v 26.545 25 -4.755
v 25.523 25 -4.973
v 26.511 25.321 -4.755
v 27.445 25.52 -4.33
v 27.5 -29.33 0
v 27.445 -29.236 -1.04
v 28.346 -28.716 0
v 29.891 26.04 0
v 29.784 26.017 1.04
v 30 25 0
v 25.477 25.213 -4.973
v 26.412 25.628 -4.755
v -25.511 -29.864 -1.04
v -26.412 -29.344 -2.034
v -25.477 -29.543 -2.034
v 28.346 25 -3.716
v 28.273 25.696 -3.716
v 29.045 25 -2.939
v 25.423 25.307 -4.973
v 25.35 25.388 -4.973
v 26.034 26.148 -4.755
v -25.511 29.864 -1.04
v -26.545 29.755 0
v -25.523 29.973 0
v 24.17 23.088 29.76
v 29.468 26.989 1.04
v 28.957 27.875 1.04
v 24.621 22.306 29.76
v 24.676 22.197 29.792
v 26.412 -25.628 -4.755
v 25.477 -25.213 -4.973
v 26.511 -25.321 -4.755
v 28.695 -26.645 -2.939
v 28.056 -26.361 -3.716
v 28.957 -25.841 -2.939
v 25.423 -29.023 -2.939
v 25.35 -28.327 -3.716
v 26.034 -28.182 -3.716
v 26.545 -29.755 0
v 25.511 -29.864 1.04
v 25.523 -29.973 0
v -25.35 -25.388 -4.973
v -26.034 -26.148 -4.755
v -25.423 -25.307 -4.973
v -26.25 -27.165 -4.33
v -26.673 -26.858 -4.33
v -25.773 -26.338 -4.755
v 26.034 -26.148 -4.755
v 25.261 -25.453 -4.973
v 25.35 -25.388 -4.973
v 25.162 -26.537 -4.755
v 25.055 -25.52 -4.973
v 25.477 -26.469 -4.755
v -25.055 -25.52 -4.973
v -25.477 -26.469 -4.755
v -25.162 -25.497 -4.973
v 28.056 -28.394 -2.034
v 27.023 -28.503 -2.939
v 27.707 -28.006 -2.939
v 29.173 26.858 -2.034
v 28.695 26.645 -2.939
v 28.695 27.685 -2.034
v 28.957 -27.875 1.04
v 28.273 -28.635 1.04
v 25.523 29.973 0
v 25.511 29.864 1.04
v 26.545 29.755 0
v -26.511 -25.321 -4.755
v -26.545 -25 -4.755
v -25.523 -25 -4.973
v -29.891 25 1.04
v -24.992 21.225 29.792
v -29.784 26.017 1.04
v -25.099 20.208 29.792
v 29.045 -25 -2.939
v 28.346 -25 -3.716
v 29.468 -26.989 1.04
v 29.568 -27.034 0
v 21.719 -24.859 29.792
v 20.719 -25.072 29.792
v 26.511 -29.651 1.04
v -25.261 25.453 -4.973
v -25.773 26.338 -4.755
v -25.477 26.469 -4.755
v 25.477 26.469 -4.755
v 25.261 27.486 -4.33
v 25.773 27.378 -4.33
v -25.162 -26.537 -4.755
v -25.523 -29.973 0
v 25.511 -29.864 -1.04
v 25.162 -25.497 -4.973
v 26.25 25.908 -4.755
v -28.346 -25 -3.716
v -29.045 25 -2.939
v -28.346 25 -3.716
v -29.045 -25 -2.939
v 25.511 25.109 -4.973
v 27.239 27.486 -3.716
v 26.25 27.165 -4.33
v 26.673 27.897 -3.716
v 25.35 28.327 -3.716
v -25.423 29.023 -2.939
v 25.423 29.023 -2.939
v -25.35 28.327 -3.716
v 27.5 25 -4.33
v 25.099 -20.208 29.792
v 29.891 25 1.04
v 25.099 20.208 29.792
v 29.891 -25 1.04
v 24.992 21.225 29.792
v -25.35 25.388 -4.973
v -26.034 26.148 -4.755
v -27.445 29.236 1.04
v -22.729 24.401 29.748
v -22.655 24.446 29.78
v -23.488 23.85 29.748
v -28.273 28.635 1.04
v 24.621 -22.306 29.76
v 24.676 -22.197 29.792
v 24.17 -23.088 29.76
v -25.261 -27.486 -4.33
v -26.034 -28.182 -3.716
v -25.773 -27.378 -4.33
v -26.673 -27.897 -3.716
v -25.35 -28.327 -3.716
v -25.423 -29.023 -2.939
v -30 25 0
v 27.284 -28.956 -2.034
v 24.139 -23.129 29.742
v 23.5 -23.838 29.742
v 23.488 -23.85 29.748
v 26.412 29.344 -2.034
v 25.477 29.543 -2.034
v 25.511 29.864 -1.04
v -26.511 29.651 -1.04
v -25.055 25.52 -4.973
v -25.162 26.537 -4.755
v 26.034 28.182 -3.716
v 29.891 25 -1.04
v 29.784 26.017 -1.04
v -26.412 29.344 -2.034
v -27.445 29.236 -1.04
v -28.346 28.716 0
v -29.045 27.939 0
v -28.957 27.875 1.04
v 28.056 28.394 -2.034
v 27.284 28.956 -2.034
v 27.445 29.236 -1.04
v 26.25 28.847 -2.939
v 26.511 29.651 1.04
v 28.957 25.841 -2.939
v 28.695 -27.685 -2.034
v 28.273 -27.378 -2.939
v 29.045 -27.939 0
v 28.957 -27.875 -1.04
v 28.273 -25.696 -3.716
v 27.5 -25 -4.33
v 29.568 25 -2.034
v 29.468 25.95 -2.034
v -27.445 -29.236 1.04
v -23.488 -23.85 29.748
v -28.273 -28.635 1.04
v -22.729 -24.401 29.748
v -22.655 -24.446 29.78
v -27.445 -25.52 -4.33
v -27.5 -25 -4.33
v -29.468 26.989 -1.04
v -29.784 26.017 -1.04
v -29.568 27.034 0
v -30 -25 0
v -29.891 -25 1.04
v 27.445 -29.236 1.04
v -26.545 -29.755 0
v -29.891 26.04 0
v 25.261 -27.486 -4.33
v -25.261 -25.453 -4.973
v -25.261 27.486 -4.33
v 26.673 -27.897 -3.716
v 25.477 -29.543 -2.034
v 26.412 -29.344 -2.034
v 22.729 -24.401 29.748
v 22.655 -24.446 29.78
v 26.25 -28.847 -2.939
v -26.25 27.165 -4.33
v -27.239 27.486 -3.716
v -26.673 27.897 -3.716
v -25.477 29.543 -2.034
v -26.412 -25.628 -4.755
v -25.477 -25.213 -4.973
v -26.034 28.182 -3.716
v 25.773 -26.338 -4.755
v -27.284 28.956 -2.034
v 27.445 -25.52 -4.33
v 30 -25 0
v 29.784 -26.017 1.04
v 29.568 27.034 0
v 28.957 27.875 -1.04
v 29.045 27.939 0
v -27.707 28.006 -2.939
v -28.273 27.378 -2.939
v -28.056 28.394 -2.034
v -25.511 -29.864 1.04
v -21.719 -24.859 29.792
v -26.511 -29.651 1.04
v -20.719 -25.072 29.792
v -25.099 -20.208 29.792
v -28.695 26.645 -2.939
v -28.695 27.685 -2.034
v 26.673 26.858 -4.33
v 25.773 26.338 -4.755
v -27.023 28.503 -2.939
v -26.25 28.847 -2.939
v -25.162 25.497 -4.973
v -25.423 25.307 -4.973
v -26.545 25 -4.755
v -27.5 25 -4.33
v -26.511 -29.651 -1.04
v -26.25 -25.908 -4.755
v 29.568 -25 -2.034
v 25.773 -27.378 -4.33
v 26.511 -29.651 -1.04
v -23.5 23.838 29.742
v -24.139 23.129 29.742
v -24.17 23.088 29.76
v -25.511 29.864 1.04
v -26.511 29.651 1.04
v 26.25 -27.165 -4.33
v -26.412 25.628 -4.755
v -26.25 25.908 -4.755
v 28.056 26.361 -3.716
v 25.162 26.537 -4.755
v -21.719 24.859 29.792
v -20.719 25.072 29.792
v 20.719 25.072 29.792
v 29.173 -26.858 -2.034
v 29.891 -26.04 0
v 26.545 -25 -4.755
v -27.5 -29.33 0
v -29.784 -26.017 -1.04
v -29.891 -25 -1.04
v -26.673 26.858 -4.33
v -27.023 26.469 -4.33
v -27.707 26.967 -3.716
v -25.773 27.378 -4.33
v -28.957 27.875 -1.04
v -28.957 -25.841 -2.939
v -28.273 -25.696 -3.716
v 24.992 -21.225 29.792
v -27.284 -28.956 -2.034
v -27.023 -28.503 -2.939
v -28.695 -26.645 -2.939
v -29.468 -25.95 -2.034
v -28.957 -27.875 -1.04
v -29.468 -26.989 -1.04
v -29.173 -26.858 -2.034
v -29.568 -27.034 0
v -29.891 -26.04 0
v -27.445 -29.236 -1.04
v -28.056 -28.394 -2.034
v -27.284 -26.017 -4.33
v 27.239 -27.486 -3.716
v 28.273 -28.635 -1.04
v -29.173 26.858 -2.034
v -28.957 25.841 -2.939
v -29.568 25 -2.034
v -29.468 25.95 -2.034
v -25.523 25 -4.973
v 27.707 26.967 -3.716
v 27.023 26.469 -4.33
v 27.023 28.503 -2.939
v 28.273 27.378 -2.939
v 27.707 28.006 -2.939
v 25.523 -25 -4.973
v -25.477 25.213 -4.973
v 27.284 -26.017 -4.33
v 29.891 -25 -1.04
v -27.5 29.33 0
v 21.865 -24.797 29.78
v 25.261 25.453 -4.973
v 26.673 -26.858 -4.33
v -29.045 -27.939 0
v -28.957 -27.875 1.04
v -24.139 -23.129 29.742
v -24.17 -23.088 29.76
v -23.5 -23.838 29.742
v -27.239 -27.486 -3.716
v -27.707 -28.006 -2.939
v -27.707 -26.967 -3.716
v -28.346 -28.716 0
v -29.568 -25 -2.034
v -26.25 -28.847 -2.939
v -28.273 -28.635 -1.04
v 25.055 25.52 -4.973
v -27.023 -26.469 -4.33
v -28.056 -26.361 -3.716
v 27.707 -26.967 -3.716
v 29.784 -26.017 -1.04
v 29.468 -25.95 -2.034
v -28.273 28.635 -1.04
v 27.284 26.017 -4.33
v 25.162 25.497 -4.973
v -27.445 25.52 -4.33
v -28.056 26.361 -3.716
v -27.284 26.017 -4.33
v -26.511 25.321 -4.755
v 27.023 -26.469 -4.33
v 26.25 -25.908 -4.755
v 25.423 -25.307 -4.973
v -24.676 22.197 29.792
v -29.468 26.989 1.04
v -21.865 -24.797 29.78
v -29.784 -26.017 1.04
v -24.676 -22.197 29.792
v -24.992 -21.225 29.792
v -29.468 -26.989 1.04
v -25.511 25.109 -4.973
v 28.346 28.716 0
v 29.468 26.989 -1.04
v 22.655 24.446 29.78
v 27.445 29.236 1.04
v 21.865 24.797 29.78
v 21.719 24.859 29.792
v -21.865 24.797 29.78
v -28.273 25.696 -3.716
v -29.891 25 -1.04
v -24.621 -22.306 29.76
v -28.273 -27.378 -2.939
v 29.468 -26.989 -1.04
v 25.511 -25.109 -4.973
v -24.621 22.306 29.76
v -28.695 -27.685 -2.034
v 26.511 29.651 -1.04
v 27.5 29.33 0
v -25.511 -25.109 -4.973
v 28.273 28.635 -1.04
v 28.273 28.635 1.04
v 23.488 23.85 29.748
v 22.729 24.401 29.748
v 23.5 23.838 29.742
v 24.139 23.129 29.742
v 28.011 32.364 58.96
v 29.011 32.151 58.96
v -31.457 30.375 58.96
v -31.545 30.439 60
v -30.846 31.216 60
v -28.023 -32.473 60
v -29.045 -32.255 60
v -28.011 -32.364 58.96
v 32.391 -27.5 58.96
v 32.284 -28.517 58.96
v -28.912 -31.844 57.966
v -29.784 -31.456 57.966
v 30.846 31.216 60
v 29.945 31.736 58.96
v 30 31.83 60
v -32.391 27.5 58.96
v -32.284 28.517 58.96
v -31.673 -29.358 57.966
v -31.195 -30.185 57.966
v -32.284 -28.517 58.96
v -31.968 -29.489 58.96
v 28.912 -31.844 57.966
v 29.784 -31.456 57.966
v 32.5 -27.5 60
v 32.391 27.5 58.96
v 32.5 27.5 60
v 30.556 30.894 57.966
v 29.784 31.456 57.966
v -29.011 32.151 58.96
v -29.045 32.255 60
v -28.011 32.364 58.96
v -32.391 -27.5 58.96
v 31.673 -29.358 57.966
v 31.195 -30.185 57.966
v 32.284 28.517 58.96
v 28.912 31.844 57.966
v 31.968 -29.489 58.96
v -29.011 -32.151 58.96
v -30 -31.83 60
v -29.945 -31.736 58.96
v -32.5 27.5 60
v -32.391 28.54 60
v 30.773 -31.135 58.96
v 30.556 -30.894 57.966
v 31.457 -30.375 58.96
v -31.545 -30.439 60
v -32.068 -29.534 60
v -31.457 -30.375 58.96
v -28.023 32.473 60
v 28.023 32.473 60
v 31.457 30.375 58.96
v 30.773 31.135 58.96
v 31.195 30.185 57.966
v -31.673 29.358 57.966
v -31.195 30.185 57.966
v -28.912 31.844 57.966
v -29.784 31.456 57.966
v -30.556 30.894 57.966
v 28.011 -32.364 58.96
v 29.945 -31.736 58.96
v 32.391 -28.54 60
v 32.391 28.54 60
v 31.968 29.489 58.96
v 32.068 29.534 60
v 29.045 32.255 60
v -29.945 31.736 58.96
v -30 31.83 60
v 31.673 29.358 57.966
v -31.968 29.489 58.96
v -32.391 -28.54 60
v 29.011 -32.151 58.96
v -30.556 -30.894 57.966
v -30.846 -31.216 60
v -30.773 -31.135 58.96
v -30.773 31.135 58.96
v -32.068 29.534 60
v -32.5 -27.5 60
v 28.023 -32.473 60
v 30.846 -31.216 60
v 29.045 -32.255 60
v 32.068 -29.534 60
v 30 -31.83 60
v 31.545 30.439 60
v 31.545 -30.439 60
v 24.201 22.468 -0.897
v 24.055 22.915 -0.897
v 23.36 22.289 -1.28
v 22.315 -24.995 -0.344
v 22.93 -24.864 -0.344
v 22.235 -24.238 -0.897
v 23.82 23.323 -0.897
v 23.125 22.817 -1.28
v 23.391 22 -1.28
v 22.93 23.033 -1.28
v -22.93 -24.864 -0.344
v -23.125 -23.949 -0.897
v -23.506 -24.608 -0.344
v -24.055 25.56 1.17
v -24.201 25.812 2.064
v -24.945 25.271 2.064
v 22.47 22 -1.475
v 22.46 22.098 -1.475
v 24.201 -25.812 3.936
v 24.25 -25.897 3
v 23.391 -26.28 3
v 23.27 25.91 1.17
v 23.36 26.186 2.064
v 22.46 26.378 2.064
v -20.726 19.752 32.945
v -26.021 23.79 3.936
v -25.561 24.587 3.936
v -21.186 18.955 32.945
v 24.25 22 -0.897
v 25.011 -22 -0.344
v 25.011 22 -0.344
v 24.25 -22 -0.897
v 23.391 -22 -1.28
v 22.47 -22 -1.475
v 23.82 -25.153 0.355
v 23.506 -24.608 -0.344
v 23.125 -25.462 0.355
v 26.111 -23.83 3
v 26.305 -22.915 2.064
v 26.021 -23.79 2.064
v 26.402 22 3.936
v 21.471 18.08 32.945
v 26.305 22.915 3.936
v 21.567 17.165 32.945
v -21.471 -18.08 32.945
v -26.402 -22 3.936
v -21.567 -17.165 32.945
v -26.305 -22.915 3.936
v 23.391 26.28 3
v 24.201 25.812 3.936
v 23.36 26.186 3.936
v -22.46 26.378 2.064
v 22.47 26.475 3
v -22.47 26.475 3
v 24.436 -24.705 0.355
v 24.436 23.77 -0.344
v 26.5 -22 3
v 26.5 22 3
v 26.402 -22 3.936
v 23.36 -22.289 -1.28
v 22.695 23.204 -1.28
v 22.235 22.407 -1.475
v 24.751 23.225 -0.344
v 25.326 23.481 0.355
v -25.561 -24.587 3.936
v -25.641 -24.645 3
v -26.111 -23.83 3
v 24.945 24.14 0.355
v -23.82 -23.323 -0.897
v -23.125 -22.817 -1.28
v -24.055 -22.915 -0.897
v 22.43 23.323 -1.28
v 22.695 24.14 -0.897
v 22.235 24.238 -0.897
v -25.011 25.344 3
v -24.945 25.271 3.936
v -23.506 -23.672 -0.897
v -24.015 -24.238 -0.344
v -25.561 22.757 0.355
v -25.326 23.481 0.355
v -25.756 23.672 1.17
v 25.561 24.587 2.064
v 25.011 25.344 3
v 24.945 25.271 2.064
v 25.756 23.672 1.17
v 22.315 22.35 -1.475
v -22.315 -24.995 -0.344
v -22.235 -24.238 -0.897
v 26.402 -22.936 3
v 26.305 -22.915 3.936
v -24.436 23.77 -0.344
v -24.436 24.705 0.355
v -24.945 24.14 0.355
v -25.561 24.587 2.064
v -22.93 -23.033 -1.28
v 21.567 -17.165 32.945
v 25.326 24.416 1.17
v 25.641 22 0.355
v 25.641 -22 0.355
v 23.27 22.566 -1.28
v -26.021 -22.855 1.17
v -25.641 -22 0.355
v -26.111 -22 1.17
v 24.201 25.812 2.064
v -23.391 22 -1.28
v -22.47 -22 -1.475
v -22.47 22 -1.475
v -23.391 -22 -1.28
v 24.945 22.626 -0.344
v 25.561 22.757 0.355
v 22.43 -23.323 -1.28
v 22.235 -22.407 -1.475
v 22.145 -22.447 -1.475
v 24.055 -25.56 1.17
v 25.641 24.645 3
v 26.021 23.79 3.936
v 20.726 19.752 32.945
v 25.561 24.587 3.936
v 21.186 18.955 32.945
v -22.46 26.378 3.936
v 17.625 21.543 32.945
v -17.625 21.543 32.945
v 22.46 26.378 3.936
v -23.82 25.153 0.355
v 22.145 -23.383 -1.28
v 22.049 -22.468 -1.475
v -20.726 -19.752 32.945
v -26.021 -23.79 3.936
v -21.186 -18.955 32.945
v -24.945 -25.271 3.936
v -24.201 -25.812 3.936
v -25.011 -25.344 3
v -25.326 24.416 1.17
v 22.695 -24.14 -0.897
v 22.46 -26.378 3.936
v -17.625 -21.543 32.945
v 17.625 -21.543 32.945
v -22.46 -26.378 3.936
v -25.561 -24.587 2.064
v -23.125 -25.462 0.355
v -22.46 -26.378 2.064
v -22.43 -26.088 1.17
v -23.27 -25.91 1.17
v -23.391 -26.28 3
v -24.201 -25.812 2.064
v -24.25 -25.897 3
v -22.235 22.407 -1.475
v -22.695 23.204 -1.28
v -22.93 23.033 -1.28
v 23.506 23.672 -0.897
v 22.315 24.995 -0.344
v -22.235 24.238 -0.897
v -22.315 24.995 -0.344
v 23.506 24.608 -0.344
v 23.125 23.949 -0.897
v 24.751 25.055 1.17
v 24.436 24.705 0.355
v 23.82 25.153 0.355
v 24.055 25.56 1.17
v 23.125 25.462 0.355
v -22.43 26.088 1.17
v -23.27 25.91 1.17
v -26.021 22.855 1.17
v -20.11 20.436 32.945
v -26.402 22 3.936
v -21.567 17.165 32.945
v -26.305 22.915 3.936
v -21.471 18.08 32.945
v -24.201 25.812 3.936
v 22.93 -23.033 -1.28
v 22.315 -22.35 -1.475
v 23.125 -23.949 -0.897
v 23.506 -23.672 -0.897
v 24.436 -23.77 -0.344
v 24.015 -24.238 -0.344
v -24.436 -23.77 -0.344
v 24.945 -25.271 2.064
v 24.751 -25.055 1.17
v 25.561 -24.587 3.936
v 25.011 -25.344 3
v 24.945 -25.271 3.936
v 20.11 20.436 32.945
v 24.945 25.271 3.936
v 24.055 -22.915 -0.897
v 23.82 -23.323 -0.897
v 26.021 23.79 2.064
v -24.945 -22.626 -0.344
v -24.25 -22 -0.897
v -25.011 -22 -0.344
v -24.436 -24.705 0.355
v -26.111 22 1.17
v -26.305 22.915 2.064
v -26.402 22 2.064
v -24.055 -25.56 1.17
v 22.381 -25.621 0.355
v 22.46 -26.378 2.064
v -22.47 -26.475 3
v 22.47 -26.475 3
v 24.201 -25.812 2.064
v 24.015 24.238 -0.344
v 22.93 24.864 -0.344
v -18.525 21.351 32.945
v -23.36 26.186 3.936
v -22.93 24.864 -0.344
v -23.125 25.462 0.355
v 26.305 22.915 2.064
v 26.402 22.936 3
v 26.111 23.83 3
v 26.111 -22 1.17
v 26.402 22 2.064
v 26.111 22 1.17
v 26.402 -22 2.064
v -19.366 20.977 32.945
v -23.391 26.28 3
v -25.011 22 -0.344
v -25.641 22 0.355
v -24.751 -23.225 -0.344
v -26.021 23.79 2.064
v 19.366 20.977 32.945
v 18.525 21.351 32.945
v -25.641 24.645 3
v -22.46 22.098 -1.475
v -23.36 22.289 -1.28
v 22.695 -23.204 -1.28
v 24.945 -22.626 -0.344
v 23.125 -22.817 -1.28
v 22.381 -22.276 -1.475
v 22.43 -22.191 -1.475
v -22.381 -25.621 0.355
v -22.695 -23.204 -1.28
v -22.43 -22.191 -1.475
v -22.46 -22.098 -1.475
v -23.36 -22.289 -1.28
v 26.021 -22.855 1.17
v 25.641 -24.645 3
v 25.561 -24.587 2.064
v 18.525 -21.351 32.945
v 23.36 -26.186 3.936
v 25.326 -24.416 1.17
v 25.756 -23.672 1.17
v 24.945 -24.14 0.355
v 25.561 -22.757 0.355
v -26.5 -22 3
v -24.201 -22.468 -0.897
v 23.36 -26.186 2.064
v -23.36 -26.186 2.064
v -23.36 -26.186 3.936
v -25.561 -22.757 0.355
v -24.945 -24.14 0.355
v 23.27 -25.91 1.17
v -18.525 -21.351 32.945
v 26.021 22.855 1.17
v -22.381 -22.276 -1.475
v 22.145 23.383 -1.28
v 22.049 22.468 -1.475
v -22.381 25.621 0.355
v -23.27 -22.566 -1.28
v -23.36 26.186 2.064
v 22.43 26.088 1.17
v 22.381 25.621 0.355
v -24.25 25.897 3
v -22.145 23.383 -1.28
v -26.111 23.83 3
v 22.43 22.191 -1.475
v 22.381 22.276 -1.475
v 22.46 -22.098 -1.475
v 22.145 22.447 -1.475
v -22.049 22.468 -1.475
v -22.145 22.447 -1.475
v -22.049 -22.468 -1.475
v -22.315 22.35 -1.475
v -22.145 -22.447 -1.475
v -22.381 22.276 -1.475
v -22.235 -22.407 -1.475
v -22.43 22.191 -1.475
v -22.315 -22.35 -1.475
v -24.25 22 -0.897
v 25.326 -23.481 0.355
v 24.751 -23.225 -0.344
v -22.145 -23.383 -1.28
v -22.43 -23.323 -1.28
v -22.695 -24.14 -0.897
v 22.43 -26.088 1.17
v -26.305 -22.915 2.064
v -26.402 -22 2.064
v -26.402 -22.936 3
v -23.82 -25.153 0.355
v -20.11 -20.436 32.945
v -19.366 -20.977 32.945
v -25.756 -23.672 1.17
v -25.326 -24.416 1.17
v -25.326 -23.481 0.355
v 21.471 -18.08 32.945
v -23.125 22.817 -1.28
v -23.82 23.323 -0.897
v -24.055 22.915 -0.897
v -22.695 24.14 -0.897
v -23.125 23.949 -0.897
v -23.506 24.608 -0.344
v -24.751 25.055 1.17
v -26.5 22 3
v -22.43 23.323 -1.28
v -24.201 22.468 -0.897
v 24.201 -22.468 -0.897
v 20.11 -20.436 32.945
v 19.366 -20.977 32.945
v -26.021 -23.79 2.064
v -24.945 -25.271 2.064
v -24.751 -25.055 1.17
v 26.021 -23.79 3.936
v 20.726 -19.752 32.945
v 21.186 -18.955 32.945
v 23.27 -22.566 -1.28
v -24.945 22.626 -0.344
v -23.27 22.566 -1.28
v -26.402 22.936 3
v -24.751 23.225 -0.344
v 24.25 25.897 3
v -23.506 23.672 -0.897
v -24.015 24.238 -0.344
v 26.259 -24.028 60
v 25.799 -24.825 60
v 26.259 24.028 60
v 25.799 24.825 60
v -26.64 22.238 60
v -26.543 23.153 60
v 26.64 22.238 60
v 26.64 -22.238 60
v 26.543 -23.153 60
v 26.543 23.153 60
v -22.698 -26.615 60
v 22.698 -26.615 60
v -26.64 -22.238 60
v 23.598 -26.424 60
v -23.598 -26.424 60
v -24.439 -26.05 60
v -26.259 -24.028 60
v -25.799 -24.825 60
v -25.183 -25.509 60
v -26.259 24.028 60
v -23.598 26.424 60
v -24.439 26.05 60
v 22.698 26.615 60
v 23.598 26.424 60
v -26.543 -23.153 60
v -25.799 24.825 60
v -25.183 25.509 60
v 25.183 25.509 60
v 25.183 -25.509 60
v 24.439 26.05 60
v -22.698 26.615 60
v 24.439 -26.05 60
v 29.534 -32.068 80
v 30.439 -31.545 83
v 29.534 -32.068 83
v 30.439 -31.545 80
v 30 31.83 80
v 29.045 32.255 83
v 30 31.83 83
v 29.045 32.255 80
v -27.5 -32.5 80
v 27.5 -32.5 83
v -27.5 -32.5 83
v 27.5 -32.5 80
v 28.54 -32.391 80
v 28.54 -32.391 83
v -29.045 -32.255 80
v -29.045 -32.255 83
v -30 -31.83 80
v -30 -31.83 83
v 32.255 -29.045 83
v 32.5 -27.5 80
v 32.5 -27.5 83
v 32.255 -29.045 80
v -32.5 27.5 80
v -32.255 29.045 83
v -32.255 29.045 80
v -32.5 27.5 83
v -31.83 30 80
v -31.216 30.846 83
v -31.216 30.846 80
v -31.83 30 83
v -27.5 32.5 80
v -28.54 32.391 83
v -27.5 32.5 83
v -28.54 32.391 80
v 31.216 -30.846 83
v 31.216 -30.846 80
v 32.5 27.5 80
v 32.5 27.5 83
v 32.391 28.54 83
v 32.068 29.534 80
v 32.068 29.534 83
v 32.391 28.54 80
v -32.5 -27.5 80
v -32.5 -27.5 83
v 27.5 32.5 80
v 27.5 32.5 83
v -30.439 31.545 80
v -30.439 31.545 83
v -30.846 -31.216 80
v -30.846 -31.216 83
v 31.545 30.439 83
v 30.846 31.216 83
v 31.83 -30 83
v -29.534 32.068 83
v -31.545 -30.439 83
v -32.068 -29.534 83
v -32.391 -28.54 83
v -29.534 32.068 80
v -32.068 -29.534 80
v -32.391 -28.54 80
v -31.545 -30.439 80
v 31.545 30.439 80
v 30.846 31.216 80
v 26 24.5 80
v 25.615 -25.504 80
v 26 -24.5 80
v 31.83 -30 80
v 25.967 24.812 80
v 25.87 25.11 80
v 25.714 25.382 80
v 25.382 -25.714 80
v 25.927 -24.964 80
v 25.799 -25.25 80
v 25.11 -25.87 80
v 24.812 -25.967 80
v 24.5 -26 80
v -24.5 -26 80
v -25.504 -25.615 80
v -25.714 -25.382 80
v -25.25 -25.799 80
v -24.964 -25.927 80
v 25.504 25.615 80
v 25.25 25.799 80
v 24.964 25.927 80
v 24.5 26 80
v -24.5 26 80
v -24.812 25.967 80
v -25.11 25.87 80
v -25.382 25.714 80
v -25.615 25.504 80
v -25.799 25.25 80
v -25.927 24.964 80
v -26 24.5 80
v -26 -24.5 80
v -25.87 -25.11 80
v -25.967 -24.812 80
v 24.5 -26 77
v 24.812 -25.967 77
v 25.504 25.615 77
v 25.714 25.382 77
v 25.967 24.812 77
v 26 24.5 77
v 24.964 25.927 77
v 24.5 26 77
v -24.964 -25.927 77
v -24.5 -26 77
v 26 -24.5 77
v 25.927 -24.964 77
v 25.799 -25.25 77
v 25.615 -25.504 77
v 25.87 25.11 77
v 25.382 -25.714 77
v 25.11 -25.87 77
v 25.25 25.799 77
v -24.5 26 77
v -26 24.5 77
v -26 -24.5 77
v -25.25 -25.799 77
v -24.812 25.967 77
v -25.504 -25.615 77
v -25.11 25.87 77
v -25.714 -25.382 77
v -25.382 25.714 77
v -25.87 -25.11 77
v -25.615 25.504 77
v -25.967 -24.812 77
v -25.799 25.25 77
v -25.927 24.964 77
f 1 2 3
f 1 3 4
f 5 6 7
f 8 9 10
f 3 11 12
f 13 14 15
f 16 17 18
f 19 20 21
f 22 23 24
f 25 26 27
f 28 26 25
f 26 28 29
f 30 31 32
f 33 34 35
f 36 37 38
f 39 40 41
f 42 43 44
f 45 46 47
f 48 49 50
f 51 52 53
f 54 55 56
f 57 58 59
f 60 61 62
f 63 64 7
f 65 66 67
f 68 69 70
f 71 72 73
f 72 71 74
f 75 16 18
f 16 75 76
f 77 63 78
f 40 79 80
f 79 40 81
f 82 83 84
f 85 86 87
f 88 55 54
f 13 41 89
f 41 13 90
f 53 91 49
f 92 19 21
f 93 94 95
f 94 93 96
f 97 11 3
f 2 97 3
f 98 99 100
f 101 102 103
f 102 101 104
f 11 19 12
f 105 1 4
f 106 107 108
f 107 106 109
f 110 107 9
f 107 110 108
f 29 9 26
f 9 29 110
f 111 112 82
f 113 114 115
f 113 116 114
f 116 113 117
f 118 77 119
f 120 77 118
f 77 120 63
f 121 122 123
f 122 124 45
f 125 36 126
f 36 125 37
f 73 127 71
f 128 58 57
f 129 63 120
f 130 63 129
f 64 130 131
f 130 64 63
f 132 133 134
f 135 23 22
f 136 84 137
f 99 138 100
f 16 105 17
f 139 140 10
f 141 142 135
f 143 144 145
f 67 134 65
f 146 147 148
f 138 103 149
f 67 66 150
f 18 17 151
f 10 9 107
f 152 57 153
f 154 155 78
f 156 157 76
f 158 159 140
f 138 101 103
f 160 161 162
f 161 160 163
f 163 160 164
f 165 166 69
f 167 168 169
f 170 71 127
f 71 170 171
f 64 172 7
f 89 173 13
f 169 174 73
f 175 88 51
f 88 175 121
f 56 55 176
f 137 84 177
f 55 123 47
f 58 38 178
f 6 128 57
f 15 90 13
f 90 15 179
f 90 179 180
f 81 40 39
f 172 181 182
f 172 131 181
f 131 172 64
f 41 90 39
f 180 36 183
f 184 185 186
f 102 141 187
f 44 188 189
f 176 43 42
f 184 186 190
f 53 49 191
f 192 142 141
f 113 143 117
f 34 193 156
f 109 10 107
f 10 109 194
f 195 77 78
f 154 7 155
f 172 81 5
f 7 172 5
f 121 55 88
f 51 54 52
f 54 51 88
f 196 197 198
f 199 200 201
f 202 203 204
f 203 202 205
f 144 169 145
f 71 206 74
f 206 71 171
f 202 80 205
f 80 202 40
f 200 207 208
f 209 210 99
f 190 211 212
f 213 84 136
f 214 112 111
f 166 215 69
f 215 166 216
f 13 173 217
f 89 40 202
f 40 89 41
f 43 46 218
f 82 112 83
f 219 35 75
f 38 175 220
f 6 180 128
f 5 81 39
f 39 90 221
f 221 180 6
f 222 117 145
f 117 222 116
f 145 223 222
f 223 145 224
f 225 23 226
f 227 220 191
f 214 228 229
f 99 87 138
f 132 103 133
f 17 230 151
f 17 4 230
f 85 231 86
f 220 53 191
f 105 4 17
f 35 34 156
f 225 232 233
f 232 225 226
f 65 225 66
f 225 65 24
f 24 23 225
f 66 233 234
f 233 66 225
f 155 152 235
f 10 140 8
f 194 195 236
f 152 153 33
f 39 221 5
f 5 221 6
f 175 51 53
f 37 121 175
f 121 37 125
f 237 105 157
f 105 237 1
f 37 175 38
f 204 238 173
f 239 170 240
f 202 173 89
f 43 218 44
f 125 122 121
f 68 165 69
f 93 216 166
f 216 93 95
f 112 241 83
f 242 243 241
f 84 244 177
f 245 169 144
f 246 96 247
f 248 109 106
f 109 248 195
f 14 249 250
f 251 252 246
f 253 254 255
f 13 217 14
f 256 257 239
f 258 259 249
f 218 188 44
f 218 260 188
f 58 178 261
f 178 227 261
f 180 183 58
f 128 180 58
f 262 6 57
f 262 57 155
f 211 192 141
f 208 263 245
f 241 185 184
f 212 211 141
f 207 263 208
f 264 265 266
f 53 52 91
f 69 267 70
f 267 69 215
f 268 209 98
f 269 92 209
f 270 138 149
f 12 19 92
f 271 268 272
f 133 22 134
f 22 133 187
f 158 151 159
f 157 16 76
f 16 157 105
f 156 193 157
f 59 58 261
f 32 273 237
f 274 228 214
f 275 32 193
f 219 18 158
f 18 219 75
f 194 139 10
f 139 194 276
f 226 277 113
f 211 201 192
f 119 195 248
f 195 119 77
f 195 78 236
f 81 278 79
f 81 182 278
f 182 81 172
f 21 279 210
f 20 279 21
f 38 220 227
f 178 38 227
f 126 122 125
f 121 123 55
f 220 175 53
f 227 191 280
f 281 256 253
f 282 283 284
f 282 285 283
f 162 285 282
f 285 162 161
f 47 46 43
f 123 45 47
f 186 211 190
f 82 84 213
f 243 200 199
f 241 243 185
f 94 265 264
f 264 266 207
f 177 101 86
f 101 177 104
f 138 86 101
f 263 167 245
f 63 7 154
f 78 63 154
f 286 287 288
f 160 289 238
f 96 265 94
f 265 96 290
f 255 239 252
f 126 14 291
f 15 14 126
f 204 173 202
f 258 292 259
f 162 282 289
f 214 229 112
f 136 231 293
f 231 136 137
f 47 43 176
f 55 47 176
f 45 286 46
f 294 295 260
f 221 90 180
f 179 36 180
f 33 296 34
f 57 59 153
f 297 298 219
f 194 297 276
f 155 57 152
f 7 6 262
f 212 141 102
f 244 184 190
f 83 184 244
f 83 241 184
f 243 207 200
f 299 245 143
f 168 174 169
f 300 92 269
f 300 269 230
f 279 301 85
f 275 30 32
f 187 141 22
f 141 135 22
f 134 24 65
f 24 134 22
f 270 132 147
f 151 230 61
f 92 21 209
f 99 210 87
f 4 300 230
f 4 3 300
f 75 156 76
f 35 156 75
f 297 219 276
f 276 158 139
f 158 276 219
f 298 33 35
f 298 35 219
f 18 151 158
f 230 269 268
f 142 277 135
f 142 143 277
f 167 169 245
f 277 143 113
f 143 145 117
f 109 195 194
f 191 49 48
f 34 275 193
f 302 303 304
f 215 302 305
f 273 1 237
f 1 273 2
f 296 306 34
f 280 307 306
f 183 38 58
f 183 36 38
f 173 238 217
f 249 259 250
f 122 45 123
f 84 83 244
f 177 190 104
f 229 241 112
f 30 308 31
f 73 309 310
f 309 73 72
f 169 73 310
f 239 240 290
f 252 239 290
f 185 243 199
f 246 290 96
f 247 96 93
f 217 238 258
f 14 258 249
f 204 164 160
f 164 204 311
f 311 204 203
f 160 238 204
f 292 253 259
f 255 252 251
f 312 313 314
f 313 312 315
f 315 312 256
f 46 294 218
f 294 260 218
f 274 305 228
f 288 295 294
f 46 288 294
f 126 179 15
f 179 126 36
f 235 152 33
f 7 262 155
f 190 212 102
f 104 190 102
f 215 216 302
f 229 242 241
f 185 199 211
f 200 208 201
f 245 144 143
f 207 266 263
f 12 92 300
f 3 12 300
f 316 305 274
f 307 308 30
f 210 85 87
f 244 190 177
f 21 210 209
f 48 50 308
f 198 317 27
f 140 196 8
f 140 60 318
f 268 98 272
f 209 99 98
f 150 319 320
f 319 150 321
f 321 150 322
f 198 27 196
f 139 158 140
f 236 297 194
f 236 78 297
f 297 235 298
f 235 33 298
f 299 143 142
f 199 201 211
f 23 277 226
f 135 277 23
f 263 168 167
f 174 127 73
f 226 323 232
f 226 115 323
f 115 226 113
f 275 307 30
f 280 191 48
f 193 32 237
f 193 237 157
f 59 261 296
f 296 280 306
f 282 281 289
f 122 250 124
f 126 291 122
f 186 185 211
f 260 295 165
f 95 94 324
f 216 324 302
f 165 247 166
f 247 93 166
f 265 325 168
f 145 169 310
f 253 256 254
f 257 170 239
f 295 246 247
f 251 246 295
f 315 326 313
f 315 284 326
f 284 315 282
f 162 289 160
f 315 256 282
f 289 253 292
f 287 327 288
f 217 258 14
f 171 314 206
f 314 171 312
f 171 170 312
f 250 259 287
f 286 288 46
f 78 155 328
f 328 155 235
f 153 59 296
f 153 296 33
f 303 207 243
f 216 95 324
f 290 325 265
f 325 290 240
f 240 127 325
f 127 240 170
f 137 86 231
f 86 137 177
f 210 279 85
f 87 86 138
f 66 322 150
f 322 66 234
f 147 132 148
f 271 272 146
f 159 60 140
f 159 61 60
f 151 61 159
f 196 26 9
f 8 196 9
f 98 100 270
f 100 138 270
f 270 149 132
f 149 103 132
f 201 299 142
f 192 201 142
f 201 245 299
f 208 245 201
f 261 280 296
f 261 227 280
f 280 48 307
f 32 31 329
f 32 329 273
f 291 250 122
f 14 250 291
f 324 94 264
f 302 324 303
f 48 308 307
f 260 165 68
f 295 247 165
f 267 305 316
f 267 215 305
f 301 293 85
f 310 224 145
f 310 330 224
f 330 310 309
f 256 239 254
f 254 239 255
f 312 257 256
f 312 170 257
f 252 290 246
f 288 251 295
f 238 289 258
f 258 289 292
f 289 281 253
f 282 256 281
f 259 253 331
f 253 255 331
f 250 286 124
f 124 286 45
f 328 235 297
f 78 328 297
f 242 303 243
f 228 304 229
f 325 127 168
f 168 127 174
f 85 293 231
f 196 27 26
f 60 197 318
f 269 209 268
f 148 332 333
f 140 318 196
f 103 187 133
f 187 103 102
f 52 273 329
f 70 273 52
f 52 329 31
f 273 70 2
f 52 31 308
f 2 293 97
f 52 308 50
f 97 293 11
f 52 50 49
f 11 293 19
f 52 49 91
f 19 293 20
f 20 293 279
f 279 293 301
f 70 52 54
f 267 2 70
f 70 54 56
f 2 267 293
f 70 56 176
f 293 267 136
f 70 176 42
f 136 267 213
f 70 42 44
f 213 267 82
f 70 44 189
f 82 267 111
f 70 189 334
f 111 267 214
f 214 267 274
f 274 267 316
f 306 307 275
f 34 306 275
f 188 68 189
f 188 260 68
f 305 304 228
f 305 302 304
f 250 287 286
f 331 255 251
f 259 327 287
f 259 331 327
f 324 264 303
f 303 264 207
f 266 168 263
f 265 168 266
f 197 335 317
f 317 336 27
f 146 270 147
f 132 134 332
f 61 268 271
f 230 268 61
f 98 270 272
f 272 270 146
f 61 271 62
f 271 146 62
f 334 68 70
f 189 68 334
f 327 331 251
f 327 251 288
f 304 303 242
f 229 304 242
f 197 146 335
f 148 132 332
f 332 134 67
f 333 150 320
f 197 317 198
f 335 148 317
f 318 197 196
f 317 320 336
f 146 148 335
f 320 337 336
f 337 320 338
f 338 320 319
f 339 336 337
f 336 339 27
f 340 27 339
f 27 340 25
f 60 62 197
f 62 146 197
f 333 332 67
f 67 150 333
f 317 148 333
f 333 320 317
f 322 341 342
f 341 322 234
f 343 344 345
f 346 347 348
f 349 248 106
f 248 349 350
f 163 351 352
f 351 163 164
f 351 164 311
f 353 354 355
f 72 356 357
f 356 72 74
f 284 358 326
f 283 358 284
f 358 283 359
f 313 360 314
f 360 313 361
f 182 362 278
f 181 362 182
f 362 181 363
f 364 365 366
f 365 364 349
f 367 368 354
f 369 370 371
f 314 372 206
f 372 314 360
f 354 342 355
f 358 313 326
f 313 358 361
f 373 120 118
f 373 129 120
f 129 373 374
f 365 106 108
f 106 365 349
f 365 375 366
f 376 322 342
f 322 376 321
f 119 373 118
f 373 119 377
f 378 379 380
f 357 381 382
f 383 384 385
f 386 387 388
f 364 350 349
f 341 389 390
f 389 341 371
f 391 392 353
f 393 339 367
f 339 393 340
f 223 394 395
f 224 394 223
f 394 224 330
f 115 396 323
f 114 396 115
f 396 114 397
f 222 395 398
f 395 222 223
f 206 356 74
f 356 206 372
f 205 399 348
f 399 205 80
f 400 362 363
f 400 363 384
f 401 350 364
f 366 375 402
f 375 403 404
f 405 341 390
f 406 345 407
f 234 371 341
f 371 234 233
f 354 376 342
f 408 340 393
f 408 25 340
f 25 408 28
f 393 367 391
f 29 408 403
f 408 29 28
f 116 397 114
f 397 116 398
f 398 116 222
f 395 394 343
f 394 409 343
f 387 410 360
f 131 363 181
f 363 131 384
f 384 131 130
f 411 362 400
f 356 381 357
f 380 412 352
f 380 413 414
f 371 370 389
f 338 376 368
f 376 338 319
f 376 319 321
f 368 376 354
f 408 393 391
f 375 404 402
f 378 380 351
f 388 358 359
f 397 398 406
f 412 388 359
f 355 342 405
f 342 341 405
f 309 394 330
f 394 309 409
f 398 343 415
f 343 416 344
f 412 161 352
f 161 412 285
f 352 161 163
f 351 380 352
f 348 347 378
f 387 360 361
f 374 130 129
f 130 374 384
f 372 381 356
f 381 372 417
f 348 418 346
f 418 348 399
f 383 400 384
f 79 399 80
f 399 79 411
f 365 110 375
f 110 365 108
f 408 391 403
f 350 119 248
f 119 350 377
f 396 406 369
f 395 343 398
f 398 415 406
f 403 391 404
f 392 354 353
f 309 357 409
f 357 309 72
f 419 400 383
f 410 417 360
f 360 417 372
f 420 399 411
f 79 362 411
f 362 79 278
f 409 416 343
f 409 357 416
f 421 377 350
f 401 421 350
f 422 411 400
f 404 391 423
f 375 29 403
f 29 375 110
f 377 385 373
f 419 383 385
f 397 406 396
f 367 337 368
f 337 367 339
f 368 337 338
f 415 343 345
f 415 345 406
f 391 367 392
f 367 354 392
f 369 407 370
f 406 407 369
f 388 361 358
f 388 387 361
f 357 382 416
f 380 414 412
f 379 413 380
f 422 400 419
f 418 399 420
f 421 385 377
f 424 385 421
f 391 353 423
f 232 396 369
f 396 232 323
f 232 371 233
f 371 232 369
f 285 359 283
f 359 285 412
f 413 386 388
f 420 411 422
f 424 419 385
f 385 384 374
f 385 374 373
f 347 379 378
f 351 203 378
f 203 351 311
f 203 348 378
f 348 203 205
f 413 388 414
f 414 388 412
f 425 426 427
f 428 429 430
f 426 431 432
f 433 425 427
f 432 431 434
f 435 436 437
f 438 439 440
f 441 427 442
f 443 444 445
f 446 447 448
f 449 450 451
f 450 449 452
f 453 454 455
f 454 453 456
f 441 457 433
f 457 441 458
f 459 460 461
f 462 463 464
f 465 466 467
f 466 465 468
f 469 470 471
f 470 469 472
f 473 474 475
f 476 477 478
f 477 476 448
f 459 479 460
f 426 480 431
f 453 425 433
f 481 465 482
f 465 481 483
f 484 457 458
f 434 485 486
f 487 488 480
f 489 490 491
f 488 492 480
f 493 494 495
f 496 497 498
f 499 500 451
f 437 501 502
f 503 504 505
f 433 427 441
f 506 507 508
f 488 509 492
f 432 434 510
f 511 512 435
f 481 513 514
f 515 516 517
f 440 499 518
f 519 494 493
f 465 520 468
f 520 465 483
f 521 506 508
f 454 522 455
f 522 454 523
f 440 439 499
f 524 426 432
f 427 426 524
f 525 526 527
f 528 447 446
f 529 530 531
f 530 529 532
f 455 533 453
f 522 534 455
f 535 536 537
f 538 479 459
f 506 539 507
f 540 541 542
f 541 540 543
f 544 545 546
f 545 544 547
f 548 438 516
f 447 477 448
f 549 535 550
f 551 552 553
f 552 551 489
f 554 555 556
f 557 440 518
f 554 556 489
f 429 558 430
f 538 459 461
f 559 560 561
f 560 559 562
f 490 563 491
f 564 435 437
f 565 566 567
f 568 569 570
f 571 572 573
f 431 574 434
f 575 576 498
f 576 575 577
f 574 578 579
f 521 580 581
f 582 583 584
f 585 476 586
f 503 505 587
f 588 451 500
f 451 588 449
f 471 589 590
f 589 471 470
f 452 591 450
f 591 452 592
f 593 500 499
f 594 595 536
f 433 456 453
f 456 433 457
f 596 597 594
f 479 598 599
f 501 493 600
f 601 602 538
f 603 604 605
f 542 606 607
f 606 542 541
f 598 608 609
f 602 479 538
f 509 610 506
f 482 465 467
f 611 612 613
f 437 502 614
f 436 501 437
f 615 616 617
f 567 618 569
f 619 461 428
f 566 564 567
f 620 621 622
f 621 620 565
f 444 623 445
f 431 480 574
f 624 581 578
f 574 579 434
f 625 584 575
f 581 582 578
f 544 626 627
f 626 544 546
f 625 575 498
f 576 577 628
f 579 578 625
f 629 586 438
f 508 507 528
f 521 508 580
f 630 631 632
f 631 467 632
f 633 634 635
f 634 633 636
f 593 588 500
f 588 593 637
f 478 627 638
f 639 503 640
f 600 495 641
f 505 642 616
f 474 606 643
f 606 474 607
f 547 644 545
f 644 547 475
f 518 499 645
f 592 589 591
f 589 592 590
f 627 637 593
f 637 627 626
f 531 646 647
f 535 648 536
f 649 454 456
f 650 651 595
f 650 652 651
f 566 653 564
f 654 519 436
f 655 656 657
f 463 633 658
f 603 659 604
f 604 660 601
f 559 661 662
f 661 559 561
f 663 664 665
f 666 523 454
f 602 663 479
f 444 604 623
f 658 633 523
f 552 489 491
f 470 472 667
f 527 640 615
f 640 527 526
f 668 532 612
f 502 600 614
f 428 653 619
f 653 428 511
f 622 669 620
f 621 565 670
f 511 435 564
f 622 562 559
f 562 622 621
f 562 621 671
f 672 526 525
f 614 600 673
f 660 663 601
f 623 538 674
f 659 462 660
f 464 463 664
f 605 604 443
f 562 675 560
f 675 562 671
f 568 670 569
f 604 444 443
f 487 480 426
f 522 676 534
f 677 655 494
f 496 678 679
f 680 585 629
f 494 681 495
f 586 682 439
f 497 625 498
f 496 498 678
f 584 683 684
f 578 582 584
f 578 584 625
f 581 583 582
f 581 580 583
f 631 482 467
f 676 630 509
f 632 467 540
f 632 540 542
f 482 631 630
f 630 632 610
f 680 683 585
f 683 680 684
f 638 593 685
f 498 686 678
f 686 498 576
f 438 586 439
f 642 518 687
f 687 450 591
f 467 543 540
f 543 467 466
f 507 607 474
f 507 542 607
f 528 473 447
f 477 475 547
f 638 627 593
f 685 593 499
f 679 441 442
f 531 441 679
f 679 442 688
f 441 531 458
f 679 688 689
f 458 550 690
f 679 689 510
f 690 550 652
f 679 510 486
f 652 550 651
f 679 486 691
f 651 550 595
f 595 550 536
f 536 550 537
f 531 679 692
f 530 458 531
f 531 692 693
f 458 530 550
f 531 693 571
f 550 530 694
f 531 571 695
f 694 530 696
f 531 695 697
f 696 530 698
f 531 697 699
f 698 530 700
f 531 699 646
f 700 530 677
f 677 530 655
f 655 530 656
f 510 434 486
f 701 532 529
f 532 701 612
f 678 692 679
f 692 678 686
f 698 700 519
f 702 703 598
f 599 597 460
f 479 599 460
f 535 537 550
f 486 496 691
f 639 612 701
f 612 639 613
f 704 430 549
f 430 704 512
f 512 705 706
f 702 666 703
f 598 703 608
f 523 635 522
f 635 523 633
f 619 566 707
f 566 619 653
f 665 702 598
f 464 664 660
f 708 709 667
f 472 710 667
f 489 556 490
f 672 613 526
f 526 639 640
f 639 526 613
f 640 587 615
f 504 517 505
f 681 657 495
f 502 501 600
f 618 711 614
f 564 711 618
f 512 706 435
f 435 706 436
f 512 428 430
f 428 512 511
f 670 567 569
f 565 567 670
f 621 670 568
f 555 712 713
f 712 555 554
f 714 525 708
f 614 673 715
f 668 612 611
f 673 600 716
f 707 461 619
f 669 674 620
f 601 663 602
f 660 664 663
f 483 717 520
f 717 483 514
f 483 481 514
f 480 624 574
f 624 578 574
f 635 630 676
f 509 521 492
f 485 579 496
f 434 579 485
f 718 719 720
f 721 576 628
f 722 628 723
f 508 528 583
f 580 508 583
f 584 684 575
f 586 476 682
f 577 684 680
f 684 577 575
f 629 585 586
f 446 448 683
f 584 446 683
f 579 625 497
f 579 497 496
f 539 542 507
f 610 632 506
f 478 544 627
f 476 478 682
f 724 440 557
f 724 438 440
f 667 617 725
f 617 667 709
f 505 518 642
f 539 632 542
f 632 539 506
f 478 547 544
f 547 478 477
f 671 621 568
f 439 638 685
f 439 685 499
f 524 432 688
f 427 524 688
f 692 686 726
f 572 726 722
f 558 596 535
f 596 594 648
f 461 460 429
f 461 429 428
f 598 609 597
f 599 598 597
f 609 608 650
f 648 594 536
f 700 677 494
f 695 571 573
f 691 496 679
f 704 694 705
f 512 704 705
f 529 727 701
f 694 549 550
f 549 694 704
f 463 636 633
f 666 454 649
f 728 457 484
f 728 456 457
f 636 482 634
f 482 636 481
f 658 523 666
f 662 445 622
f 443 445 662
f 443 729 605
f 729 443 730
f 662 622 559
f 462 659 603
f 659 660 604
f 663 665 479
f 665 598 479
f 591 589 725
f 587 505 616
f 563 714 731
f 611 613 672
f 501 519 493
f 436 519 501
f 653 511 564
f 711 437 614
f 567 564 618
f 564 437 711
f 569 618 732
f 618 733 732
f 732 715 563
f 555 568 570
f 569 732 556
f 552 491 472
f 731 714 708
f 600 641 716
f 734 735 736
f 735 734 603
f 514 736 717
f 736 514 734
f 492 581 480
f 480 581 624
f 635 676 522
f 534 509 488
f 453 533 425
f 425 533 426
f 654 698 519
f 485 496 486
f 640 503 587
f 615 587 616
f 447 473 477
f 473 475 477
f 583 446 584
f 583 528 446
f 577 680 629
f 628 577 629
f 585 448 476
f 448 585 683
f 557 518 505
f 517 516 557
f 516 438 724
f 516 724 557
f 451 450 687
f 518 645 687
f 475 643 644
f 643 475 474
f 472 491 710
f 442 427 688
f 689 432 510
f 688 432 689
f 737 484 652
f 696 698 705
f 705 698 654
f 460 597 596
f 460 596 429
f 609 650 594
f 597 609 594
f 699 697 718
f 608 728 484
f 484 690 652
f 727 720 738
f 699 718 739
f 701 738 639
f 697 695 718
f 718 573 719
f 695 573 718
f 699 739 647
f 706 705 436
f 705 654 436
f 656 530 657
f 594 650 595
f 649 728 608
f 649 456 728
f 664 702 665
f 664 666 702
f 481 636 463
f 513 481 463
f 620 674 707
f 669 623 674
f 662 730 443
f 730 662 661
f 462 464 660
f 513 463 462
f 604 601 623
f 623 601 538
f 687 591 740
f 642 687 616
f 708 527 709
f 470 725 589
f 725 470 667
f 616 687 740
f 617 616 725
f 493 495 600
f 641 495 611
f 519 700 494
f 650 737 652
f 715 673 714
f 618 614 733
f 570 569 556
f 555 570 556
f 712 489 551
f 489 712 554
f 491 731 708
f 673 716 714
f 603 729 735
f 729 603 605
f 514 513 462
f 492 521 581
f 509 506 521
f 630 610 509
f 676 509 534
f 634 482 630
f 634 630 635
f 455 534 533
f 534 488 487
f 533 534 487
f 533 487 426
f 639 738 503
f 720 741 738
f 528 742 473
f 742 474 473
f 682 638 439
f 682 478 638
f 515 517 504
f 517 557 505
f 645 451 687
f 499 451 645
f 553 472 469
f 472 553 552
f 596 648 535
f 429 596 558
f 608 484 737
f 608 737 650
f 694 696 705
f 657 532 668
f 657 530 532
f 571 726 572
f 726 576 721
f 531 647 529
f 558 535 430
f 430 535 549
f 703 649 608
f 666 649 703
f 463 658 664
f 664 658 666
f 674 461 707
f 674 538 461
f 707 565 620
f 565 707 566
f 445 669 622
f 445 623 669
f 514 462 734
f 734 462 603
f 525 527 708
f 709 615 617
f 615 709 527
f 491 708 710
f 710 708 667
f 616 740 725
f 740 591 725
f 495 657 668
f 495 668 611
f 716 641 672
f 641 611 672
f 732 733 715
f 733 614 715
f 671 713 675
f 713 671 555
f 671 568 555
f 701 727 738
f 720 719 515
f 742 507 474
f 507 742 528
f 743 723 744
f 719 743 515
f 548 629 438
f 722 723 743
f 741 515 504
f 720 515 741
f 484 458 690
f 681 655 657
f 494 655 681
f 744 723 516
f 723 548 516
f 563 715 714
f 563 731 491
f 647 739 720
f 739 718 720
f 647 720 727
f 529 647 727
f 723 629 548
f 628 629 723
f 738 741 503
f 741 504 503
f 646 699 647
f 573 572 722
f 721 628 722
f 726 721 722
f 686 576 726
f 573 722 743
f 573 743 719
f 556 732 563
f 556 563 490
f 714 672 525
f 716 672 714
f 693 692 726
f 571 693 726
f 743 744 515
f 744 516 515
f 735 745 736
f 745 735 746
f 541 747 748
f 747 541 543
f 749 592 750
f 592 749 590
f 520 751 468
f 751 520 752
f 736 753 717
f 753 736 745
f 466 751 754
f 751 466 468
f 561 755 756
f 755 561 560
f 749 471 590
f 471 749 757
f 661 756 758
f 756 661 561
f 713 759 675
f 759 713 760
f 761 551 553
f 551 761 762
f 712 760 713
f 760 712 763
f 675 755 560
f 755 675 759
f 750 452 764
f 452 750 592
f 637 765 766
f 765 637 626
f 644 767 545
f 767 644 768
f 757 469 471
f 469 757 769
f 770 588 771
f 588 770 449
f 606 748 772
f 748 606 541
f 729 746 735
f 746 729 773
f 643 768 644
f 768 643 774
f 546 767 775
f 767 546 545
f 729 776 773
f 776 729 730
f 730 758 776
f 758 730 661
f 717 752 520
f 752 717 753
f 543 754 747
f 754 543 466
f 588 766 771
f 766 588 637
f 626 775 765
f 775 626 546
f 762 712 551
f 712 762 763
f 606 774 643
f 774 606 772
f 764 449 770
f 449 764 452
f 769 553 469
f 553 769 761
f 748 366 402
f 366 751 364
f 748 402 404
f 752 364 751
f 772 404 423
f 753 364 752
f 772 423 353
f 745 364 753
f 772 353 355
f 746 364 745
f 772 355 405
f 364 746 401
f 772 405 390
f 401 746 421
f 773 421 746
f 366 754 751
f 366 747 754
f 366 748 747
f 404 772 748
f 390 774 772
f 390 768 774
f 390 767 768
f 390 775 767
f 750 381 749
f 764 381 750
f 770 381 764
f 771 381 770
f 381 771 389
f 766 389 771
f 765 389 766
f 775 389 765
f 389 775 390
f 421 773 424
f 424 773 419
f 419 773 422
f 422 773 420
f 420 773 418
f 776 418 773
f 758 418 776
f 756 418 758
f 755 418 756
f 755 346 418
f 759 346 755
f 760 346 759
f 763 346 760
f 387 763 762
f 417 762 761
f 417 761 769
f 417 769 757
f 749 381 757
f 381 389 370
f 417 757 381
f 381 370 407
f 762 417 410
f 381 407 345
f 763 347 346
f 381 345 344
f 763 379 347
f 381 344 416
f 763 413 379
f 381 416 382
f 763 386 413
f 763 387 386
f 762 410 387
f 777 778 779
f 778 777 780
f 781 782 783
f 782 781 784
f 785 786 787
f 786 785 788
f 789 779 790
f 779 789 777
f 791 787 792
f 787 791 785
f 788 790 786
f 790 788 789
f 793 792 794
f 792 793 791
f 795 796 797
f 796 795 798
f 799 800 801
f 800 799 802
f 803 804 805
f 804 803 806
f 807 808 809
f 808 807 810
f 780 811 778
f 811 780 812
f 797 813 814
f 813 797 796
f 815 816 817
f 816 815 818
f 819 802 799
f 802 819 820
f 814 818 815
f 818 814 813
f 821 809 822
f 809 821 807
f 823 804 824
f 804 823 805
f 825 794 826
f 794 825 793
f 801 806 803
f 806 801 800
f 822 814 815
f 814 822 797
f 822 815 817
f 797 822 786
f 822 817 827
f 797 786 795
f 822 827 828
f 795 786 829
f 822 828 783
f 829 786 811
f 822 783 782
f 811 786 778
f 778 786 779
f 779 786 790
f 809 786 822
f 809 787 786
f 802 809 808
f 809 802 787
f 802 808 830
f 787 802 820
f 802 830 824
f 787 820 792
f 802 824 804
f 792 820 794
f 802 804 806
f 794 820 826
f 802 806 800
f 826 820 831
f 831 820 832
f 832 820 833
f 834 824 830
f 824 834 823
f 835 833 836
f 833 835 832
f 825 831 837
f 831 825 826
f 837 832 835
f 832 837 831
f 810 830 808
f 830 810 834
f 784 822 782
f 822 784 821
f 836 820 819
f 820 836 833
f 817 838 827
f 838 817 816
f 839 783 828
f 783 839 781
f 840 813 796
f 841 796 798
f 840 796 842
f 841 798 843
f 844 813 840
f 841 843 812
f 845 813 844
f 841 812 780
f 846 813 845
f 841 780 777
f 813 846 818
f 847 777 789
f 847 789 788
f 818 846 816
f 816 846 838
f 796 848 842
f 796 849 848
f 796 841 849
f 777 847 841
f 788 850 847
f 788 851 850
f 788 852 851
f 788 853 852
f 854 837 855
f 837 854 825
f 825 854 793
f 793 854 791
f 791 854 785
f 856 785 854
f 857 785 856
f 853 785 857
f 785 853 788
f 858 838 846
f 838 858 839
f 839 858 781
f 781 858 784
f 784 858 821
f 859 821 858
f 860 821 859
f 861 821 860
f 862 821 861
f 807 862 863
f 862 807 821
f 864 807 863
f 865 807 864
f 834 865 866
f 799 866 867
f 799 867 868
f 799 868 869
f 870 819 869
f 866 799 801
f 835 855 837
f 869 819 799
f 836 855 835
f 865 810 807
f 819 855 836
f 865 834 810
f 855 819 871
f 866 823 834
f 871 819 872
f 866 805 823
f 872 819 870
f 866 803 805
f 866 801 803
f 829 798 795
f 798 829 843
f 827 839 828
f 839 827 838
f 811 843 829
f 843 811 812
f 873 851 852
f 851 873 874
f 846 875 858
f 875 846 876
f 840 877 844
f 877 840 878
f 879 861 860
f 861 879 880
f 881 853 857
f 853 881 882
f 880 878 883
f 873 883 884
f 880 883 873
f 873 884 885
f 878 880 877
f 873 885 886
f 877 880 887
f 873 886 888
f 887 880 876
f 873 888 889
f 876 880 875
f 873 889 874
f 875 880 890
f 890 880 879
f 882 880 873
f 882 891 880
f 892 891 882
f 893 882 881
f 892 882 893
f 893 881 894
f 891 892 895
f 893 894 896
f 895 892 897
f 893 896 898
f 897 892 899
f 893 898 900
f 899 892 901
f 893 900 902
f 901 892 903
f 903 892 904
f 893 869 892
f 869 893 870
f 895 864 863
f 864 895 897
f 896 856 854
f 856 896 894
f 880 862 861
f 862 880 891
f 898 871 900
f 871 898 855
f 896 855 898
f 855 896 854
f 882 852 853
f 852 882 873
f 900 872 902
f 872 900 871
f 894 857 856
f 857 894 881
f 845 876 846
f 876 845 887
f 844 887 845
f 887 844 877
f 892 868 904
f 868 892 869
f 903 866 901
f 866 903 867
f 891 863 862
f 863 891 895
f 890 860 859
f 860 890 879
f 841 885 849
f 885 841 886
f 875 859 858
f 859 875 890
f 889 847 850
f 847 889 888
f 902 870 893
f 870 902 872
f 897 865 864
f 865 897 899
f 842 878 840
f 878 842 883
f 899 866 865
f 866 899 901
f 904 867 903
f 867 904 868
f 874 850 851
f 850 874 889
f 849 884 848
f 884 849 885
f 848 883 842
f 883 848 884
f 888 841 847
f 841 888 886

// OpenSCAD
// ======================================================
// PROJECT: Parametric "Fluid-Joint" Storage System
// AUTHOR: Timothy Okibe Ogese
// PORTFOLIO ITEM #1: Computational Design & Parametric Logic
// 
// TECHNICAL MASTERY INCLUDED:
// 1. Union-Minkowski Blending (Seamless organic joints)
// 2. Hybrid CSG (Intersection-based flattening for manufacturing)
// 3. Single-Source-of-Truth Parameterization
// 4. Assembly Tolerance (Calculated Lid Clearance)
// ======================================================

// -------------------------
// 1. GLOBAL PARAMETERS
// -------------------------
base_side    = 50;   // Footprint width/depth
mid_side     = 40;   // Shared geometric anchor
top_side     = 55;   // Mouth width/depth

height_base  = 30;
height_top   = 30;

roundness    = 5;    // Minkowski radius
wall_t       = 3;    // Consistent wall & base thickness

/* [Lid Settings] */
lid_thickness = 3;
clearance     = 0.5; // Gap for 3D printing fit
lid_float     = 20;  // Display offset

// Derived Constants
total_h = height_base + height_top;
$fn = 30; // Set to 80+ for production render (F6)

// -------------------------
// 2. MODULE: THE CONTAINER
// -------------------------
module container_shell() {
    difference() {
        // OUTER MASS: Blended via Minkowski
        minkowski() {
            union() {
                linear_extrude(height = height_base, scale = mid_side/base_side) 
                    square(base_side, center=true);
                translate([0, 0, height_base])
                    linear_extrude(height = height_top, scale = top_side/mid_side) 
                        square(mid_side, center=true);
            }
            sphere(r = roundness);
        }

        // INNER VOID: Shifted UP by wall_t to keep base solid
        translate([0, 0, wall_t])
        minkowski() {
            union() {
                linear_extrude(height = height_base, scale = (mid_side-wall_t*2)/(base_side-wall_t*2)) 
                    square(base_side-wall_t*2, center=true);
                translate([0, 0, height_base])
                    linear_extrude(height = height_top + 10, scale = (top_side-wall_t*2)/(mid_side-wall_t*2)) 
                        square(mid_side-wall_t*2, center=true);
            }
            sphere(r = roundness - 0.5); 
        }
    }
}

// -------------------------
// 3. RENDER: CONTAINER (Clipped for Flat Top)
// -------------------------
intersection() {
    container_shell();
    
    // Cutting Box: Preserves rounded base, flattens top rim
    translate([0, 0, (total_h - roundness)/2])
        cube([base_side*4, base_side*4, total_h + roundness], center=true);
}

// -------------------------
// 4. RENDER: MATCHING LID
// -------------------------
translate([0, 0, total_h + lid_float]) {
    // Lid Plate
    color("DodgerBlue")
    linear_extrude(height = lid_thickness)
    offset(r = roundness)
        square(top_side, center=true);
    
    // Lid Plug (Recessed Fit)
    color("SkyBlue")
    translate([0, 0, -lid_thickness])
    linear_extrude(height = lid_thickness)
    offset(r = roundness - wall_t - clearance)
        square(top_side - wall_t*2, center=true);
}
